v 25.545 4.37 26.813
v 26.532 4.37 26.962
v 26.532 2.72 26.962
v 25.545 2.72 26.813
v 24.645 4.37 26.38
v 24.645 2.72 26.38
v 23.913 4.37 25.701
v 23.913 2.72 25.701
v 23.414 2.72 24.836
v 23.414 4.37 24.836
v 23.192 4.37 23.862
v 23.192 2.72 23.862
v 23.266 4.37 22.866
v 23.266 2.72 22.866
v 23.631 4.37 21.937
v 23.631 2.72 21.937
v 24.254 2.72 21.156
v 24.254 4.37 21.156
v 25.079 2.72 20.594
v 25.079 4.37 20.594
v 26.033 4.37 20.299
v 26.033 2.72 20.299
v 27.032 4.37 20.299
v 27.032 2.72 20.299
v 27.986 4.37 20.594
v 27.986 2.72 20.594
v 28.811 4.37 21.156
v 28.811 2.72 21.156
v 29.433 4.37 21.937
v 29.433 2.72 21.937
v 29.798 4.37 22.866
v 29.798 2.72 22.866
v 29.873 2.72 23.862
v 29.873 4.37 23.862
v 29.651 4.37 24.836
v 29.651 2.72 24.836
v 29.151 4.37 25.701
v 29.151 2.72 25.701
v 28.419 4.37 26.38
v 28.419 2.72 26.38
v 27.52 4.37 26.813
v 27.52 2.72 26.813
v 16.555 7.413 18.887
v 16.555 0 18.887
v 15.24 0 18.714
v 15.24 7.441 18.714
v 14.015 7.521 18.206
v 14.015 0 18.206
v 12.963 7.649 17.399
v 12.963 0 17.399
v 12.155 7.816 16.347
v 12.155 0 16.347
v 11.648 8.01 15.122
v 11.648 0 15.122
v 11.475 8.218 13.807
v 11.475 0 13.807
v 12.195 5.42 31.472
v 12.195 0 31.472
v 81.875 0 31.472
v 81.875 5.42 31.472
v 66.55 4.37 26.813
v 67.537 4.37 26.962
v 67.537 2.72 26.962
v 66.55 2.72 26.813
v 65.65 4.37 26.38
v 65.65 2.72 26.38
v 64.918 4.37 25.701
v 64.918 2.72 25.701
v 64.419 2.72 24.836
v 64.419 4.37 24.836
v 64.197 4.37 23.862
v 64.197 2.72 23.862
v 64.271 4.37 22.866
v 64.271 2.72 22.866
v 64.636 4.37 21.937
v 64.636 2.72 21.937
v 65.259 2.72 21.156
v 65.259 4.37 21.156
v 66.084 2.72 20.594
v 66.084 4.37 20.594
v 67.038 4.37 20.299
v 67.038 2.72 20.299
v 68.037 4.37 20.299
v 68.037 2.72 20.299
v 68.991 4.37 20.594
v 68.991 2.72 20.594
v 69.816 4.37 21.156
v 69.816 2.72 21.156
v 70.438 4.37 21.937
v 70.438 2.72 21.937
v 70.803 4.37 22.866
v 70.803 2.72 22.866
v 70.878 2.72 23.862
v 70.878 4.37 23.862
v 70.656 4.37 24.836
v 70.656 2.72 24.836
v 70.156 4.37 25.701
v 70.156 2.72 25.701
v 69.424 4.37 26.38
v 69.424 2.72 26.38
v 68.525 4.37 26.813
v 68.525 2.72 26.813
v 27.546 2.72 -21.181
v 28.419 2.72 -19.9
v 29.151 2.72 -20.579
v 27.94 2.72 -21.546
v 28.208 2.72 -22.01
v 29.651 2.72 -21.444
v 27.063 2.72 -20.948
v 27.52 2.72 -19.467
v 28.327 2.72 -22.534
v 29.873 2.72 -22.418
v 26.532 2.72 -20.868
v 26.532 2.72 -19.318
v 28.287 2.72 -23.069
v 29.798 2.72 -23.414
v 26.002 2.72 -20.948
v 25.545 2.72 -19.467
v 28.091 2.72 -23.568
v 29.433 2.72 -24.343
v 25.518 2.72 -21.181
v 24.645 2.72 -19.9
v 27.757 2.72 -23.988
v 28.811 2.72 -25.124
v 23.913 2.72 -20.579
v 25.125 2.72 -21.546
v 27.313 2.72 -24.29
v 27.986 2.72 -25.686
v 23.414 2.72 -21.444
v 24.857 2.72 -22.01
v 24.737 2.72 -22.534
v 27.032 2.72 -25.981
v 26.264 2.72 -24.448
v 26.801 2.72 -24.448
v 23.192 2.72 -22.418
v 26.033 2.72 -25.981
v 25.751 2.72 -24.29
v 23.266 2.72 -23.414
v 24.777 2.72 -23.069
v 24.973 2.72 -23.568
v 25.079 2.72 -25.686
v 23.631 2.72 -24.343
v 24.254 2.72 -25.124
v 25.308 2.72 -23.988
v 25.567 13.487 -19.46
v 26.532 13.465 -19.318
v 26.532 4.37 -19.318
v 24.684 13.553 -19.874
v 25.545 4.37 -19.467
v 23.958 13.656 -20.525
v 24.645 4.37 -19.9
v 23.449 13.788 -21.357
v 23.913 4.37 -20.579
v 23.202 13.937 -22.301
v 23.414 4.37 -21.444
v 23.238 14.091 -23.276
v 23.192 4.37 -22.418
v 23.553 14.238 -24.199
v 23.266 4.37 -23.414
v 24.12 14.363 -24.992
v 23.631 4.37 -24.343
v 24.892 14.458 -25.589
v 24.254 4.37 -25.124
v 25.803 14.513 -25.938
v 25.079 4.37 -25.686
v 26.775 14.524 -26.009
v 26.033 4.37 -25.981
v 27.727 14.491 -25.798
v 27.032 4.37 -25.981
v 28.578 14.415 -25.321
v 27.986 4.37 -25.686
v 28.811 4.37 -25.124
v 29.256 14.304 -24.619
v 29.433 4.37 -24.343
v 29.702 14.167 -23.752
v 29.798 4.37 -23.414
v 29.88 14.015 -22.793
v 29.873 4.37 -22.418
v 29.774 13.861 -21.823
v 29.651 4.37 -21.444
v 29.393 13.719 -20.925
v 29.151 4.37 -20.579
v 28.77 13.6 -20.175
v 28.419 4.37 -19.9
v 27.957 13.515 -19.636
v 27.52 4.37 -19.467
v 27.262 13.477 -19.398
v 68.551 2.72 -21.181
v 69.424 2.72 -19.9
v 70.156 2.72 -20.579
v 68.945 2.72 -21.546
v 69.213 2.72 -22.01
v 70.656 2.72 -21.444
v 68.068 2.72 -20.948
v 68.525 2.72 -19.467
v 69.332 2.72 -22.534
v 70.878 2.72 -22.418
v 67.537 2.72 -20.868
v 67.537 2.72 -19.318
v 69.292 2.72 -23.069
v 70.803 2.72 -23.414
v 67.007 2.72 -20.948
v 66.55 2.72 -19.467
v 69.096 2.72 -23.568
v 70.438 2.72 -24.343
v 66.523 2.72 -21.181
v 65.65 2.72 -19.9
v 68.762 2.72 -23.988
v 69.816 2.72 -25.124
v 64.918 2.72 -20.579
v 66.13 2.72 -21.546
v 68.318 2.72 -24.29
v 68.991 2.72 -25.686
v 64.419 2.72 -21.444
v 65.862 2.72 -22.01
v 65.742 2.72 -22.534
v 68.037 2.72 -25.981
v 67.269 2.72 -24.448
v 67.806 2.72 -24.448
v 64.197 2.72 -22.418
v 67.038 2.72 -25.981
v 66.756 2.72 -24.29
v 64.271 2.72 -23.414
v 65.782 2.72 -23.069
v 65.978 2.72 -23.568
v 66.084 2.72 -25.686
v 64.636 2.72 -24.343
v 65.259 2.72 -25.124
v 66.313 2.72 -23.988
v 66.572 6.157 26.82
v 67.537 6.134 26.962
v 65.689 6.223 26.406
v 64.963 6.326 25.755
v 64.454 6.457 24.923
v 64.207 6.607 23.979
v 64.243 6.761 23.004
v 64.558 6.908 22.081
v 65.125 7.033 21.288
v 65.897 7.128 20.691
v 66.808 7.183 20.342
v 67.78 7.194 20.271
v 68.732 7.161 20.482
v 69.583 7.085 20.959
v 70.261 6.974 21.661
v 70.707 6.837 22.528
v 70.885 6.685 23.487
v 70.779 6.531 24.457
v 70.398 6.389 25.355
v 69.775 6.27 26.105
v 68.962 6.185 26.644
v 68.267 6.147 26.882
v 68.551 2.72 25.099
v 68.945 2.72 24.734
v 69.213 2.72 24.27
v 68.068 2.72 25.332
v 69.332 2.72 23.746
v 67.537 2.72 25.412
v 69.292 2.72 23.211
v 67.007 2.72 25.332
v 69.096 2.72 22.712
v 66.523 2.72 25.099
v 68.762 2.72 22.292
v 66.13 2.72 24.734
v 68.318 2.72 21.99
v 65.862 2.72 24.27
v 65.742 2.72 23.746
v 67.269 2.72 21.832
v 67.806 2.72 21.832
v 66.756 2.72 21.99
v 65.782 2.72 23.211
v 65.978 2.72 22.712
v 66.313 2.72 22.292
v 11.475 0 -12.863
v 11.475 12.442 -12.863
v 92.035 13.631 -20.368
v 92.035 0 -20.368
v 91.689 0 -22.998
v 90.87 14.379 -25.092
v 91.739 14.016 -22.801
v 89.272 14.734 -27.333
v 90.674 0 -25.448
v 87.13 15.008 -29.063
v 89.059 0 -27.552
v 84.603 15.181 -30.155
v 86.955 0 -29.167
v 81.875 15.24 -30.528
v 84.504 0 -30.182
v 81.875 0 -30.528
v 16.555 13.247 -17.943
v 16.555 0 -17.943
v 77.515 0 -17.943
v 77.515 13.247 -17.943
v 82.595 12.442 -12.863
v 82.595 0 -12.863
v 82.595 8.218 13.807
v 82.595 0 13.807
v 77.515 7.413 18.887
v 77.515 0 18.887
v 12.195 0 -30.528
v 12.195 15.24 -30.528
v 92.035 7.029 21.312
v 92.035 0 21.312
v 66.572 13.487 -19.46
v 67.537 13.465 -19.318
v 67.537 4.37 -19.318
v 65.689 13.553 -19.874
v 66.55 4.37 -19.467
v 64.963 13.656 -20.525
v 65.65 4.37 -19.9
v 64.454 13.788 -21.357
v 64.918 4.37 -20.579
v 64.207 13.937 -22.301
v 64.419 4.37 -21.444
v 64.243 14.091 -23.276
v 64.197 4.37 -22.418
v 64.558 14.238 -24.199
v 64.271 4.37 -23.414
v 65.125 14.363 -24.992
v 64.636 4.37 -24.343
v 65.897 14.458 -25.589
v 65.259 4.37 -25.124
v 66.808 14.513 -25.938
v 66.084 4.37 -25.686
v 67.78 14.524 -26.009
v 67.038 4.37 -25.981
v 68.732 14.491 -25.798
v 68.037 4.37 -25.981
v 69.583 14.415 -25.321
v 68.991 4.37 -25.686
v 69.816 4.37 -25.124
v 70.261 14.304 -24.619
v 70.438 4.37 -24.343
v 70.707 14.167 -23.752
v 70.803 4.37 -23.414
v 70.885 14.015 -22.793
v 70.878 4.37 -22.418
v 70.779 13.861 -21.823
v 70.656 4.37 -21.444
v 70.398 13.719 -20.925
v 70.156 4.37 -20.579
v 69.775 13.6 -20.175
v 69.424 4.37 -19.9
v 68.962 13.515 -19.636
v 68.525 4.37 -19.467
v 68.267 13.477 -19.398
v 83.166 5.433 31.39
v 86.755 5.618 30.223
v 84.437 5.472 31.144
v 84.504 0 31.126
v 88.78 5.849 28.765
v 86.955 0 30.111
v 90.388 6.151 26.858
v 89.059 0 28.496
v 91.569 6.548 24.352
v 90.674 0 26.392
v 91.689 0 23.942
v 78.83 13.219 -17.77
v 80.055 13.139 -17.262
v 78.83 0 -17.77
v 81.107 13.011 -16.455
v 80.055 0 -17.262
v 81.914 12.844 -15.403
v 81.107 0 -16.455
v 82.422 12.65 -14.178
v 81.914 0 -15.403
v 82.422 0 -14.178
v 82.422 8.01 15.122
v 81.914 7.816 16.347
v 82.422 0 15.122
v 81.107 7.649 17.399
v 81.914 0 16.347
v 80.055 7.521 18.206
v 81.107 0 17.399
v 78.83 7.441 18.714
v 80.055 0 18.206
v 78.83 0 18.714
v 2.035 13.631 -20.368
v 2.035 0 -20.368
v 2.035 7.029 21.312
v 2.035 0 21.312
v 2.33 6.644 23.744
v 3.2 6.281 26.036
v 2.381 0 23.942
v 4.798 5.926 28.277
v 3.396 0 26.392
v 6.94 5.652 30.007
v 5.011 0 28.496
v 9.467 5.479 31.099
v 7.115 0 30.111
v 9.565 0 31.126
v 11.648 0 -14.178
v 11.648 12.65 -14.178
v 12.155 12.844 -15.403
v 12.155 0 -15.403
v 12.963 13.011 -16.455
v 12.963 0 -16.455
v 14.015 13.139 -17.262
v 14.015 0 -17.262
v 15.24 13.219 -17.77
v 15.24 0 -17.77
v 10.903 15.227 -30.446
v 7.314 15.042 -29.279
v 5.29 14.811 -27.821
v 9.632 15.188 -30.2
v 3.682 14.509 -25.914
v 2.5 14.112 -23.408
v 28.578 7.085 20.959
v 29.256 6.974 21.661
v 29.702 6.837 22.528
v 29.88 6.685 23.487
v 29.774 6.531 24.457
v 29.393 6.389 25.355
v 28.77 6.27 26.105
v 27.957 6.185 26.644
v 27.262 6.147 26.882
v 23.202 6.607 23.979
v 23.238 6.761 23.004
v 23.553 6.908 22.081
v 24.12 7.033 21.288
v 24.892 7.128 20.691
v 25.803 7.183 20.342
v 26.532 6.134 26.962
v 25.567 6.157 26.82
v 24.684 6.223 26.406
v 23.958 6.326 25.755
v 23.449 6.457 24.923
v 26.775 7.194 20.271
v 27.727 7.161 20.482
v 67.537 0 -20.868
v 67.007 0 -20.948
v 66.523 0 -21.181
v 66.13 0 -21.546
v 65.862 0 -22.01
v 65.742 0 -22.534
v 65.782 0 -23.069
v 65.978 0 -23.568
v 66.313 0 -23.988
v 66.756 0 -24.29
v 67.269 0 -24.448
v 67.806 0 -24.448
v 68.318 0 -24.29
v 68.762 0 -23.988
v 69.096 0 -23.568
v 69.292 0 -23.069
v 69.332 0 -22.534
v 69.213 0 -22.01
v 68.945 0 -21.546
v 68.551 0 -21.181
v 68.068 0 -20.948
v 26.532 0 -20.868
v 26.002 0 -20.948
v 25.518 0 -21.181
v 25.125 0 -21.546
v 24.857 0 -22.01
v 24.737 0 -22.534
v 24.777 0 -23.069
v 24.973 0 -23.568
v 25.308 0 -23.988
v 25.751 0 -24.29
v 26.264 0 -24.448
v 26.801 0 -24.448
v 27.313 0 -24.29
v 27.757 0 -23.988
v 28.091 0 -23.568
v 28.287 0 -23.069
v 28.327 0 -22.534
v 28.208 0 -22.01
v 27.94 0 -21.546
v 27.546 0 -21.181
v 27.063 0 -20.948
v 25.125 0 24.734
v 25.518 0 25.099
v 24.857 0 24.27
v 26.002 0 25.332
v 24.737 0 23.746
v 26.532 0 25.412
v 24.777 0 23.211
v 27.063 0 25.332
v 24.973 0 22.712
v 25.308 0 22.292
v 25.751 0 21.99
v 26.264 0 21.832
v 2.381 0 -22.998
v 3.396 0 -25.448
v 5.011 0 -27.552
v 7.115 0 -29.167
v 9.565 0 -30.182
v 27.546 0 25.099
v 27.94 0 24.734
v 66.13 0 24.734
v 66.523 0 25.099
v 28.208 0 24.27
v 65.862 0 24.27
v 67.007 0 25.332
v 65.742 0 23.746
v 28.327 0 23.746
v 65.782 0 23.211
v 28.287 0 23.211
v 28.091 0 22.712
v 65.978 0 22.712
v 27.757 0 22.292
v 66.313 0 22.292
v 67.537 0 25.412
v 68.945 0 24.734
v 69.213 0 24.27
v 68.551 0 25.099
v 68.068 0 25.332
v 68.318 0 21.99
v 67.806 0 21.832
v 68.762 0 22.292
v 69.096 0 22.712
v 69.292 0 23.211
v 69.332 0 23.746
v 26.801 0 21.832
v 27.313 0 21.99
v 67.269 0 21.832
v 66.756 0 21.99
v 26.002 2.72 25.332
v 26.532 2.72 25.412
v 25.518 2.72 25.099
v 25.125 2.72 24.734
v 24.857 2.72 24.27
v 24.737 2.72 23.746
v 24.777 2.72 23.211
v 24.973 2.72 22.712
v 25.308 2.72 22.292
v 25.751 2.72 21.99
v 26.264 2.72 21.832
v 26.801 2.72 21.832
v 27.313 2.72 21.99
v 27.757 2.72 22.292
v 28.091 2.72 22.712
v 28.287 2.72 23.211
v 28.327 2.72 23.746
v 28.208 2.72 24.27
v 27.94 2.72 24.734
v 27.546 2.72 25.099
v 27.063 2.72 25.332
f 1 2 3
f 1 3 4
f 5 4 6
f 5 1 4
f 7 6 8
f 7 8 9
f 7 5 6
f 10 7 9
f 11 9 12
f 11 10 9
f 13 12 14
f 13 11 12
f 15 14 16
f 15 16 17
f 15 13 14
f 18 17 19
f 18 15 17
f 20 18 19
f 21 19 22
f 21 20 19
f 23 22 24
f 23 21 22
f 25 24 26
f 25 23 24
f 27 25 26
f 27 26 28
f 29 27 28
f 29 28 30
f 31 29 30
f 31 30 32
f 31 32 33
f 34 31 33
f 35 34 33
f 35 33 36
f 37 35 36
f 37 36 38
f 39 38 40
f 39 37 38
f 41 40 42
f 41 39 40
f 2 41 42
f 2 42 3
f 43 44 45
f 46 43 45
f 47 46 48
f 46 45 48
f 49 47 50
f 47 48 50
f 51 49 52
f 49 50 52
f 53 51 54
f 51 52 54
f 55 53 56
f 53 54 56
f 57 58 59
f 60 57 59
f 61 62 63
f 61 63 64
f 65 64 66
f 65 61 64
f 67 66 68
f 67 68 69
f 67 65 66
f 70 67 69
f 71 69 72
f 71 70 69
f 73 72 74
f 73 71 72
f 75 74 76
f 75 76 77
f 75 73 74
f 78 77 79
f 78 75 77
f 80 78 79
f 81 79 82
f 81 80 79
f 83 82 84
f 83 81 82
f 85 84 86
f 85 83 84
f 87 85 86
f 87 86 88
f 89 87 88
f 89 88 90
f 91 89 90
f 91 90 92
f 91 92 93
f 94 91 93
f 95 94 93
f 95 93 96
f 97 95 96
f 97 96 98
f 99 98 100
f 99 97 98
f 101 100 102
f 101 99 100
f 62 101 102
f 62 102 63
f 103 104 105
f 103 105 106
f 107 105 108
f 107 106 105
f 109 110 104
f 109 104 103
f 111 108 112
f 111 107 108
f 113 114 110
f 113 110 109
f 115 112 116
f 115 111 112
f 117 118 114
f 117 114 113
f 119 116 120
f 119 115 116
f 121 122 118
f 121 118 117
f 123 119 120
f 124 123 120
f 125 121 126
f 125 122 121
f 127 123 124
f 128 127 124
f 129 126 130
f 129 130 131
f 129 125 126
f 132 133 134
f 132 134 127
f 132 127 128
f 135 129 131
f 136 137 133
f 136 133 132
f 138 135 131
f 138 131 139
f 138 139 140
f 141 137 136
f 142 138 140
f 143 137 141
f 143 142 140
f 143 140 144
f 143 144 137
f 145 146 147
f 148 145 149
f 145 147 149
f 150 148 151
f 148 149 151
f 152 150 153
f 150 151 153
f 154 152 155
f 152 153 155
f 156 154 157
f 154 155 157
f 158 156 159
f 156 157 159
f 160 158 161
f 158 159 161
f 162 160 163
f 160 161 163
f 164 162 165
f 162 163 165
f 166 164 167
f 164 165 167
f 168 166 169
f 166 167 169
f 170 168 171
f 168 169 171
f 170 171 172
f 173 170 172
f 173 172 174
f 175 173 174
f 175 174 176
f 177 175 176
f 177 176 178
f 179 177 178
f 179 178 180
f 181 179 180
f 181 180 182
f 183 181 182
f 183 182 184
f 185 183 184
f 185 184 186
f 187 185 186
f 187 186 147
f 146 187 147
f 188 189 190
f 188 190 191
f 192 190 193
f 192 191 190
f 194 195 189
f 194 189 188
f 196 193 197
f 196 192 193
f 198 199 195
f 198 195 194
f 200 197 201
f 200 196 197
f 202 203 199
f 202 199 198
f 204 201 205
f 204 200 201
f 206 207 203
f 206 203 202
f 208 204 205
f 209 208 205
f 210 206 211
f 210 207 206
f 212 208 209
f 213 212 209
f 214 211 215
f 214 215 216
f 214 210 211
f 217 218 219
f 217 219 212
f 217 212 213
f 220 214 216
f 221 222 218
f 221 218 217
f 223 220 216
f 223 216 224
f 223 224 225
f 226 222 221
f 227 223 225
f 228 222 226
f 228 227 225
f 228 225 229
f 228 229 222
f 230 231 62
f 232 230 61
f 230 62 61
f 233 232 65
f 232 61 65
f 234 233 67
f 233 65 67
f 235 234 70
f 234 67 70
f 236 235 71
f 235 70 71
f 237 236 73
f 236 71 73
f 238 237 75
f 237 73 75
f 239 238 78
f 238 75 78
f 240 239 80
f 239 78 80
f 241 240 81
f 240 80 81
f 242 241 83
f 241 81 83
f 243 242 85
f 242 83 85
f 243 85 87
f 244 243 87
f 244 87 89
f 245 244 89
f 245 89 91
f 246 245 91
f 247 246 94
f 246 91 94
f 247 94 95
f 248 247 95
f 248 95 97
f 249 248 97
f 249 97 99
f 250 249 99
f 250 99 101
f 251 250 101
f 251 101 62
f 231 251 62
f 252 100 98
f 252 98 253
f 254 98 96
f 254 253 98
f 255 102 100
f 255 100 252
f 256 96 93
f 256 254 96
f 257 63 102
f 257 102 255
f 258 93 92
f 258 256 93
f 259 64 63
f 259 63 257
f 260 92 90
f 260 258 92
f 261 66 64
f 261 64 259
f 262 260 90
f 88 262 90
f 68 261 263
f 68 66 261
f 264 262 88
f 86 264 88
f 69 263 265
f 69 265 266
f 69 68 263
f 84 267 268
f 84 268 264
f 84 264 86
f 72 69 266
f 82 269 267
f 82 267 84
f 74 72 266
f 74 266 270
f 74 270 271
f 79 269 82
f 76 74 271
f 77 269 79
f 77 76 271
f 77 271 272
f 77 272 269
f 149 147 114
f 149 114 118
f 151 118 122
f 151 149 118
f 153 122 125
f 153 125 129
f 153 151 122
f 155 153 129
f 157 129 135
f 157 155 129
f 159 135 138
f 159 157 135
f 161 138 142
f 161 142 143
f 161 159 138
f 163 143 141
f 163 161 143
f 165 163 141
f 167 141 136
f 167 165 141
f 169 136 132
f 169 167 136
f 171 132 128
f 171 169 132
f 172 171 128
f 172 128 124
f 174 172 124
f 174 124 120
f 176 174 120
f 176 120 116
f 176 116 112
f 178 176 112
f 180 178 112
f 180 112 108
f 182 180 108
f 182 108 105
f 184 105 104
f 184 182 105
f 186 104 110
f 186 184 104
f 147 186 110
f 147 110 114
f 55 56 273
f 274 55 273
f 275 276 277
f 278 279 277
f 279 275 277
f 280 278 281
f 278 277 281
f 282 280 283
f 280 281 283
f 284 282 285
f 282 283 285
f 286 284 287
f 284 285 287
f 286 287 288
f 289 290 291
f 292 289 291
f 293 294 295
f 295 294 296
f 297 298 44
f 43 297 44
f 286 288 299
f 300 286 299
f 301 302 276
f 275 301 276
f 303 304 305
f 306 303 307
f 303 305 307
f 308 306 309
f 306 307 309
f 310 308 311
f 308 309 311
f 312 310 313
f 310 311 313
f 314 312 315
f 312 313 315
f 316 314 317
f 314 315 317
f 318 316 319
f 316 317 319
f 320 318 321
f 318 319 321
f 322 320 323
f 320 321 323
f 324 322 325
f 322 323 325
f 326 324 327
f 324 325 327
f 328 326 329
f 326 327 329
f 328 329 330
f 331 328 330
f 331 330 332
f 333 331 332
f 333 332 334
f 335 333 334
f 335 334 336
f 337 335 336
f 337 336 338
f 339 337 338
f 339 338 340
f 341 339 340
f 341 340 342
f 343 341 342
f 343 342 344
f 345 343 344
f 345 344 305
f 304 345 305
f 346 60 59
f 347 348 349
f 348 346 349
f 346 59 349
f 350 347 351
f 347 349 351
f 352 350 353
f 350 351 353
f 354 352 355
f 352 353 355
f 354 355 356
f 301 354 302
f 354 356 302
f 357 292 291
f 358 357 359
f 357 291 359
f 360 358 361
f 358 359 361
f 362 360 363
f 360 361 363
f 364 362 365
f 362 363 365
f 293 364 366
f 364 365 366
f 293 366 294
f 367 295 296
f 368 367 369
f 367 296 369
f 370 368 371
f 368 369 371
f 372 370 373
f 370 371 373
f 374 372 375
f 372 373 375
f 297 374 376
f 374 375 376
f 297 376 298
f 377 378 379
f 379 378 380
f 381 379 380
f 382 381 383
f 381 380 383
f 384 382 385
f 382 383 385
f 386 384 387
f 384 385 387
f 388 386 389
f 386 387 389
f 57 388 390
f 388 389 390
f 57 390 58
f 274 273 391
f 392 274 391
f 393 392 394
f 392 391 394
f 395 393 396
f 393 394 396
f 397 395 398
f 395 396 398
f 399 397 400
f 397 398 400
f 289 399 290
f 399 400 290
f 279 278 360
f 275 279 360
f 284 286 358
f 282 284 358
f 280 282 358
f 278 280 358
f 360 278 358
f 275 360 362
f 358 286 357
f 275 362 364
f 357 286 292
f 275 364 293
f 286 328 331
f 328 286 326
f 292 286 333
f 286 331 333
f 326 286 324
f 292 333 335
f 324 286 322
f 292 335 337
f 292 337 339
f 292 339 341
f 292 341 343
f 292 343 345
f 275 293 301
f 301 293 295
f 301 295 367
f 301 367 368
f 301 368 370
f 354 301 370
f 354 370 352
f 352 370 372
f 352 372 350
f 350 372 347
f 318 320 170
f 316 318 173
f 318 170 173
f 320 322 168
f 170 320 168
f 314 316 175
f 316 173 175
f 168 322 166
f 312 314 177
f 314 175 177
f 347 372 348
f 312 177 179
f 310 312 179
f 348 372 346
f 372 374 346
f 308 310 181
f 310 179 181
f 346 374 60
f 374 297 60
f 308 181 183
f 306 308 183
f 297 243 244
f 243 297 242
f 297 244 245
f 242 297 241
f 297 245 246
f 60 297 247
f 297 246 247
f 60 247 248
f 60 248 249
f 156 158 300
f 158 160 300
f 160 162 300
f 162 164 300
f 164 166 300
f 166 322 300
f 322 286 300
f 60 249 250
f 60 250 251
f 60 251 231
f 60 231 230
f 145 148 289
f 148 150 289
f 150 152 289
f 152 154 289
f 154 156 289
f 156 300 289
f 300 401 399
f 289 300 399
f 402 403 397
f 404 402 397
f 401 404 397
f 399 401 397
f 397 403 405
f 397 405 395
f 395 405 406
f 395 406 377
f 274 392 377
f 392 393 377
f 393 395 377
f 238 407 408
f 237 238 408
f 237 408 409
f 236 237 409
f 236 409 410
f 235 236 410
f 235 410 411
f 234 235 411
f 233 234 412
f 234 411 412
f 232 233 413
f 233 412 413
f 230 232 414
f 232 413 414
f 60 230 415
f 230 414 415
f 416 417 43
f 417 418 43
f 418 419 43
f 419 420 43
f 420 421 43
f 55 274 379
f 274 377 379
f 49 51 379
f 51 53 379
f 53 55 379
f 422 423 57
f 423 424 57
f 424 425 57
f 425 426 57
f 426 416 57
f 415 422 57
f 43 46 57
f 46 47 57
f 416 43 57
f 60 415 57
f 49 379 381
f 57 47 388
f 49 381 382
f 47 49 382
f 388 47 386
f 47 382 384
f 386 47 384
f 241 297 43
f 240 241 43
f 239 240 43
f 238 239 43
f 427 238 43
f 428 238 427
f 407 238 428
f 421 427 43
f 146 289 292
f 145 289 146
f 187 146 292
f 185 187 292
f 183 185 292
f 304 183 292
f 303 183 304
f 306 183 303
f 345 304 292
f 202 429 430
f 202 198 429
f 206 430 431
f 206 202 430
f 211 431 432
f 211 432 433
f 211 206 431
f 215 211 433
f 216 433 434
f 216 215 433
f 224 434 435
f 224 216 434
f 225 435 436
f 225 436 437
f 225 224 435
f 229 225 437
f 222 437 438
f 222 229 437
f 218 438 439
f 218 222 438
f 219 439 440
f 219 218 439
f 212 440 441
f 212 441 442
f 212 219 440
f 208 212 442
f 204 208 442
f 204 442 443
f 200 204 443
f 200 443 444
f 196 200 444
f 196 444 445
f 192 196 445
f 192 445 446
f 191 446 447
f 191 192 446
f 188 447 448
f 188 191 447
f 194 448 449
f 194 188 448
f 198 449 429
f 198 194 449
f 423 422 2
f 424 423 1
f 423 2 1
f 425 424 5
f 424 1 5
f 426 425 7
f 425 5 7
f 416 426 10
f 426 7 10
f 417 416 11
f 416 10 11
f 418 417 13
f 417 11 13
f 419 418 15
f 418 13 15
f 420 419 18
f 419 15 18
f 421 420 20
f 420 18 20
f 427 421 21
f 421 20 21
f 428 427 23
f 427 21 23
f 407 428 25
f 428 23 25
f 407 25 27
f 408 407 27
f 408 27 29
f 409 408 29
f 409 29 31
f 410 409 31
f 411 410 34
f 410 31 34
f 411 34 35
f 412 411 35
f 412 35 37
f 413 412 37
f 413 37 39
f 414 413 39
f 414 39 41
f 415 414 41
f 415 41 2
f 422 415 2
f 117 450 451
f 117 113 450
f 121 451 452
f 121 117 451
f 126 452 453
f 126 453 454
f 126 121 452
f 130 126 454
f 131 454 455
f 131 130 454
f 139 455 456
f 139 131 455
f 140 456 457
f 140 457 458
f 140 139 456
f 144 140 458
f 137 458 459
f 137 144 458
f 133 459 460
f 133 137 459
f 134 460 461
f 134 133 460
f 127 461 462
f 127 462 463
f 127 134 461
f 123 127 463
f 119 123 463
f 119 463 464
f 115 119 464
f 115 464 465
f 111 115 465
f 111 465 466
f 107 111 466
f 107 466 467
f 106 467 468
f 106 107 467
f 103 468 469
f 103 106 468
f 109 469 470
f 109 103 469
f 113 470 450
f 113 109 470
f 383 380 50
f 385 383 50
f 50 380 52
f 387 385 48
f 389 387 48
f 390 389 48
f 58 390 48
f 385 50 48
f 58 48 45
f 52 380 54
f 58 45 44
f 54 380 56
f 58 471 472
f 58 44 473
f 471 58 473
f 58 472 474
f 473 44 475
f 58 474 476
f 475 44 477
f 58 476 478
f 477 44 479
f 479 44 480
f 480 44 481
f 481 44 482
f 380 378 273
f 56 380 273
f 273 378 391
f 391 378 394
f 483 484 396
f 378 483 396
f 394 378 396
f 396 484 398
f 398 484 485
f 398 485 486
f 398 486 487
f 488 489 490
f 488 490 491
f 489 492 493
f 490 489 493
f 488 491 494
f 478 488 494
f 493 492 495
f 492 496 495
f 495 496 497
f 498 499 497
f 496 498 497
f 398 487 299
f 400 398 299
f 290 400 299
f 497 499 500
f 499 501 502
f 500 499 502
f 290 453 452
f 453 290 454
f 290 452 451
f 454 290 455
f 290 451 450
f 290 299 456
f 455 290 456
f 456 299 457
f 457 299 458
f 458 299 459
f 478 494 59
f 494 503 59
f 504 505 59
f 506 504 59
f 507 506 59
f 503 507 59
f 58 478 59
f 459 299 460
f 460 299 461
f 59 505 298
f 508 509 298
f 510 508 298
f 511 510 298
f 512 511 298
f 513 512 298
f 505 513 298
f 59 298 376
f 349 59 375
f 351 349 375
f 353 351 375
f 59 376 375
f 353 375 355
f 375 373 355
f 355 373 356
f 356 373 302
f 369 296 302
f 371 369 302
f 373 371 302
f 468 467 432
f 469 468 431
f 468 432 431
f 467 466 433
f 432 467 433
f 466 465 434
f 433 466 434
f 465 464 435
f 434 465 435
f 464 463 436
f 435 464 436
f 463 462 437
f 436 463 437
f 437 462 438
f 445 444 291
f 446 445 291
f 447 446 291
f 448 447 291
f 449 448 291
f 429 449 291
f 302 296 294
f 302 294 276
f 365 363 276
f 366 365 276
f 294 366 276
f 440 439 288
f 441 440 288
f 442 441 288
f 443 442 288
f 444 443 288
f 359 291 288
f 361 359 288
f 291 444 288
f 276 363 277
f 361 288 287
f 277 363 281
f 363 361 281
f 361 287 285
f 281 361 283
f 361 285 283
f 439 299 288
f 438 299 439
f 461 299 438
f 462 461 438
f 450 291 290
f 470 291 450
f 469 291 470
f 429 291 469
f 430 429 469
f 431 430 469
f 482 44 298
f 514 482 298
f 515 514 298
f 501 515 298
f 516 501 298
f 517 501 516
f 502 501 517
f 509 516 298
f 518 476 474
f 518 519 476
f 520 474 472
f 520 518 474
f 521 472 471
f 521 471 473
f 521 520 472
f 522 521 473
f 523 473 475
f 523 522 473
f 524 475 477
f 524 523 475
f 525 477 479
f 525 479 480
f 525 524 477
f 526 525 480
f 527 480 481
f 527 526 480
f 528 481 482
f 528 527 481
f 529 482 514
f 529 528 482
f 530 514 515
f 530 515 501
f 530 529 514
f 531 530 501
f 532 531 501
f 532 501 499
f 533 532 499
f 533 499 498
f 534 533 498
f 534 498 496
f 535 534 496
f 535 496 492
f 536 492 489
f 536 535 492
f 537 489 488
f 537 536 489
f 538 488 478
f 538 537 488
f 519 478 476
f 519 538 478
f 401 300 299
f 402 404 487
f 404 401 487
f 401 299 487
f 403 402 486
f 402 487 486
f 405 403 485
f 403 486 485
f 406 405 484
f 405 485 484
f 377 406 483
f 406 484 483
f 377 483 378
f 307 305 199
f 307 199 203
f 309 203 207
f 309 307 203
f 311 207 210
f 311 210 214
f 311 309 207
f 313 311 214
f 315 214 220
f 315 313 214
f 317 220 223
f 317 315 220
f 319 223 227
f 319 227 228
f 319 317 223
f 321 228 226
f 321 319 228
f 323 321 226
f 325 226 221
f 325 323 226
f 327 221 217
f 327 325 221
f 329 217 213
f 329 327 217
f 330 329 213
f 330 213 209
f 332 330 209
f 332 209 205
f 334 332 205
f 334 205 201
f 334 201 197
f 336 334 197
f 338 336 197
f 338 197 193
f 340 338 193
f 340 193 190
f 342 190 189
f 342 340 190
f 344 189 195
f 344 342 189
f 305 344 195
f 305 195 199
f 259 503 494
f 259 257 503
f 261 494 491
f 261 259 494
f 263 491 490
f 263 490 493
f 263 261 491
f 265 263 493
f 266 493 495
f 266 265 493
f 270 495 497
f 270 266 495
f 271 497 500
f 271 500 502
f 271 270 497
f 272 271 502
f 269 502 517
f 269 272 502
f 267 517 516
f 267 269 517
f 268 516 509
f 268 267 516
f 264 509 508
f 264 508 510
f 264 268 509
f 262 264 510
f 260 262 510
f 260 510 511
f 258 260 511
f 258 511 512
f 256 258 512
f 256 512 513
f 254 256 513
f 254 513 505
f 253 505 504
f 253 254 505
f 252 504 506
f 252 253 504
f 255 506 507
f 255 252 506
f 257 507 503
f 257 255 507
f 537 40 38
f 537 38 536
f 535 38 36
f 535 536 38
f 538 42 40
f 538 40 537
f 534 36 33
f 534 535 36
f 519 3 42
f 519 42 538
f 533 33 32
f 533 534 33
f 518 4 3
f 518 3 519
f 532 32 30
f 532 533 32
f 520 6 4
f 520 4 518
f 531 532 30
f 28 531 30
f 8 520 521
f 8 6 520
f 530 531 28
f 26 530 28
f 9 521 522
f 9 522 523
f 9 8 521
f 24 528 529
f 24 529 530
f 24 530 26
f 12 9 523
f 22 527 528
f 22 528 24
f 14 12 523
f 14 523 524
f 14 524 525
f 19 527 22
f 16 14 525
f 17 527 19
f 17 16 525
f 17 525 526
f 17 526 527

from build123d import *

# Parameters (mm, degrees)
BOSS_EXTRUDE1_DEPTH            = 15.24
CUT_EXTRUDE1_DEPTH             = 97.554341556
CBORE_FOR_M3_SBHCS2_AT_2_COUNT = 2
CBORE_FOR_M3_SBHCS2_AT_2_PITCH = 41.005
CBORE_FOR_M3_SBHCS2_AT_3_COUNT = 2
CBORE_FOR_M3_SBHCS2_AT_3_PITCH = 61.832422118
CBORE_FOR_M3_SBHCS2_AT_4_COUNT = 2
CBORE_FOR_M3_SBHCS2_AT_4_PITCH = 46.28
SKETCH16_R                     = 3.35
CUT_EXTRUDE2_DEPTH             = 98.872548965


with BuildPart() as part:
    # Sketch2 → Boss-Extrude1 (new body)
    with BuildSketch(Plane(origin=(0, 0, 0), x_dir=(1, 0, 0), z_dir=(0, 1, 0))):
        with BuildLine():
            Line((81.8747525, 30.528055776), (12.1947525, 30.528055776))
            ThreePointArc((12.1947525, 30.528055776), (5.010547603, 27.552260673), (2.0347525, 20.368055776))
            Line((2.0347525, 20.368055776), (2.0347525, -21.311944224))
            ThreePointArc((2.0347525, -21.311944224), (5.010547603, -28.496149121), (12.1947525, -31.471944224))
            Line((12.1947525, -31.471944224), (81.8747525, -31.471944224))
            ThreePointArc((81.8747525, -31.471944224), (89.058957397, -28.496149121), (92.0347525, -21.311944224))
            Line((92.0347525, -21.311944224), (92.0347525, 20.368055776))
            ThreePointArc((92.0347525, 20.368055776), (89.058957397, 27.552260673), (81.8747525, 30.528055776))
        make_face()
        with BuildLine():
            Line((16.5547525, 17.943055776), (77.5147525, 17.943055776))
            ThreePointArc((77.5147525, 17.943055776), (81.106854948, 16.455158224), (82.5947525, 12.863055776))
            Line((82.5947525, 12.863055776), (82.5947525, -13.806944224))
            ThreePointArc((82.5947525, -13.806944224), (81.106854948, -17.399046672), (77.5147525, -18.886944224))
            Line((77.5147525, -18.886944224), (16.5547525, -18.886944224))
            ThreePointArc((16.5547525, -18.886944224), (12.962650051, -17.399046672), (11.4747525, -13.806944224))
            Line((11.4747525, -13.806944224), (11.4747525, 12.863055776))
            ThreePointArc((11.4747525, 12.863055776), (12.962650051, 16.455158224), (16.5547525, 17.943055776))
        make_face(mode=Mode.SUBTRACT)
    extrude(amount=BOSS_EXTRUDE1_DEPTH)

    # Sketch3 → Cut-Extrude1 (cut, through all)
    with BuildSketch(Plane.ZY.offset(-2.0347525)):
        Polygon((21.311944224, 15.24), (-20.368055776, 15.24), (-30.528055776, 15.24), (31.471944224, 5.4201647), (31.471944224, 15.24), align=None)
    extrude(amount=-CUT_EXTRUDE1_DEPTH, mode=Mode.SUBTRACT)

    # Sketch15 → CBORE for M3 SBHCS2 (revolve, cut)
    with BuildSketch(Plane(origin=(67.5372525, 4.37, 23.611944224), x_dir=(0, 0, 1), z_dir=(1, 0, 0))):
        Polygon((0, 0), (0, 4.37), (1.8, 4.37), (1.8, 1.65), (3.35, 1.65), (3.35, 0), align=None)
    cbore_for_m3_sbhcs2 = revolve(axis=Axis((67.5372525, 10.72, 23.611944224), (0, -1, 0)), mode=Mode.SUBTRACT)

    # CBORE for M3 SBHCS2 at 2: CBORE for M3 SBHCS2 ×2
    with Locations(*[(-i * CBORE_FOR_M3_SBHCS2_AT_2_PITCH, 0, 0) for i in range(1, CBORE_FOR_M3_SBHCS2_AT_2_COUNT)]):
        add(cbore_for_m3_sbhcs2, mode=Mode.SUBTRACT)

    # CBORE for M3 SBHCS2 at 3: CBORE for M3 SBHCS2 ×2
    with Locations(*[Vector(-0.6631634116100382, 0, -0.7484746418561787) * (i * CBORE_FOR_M3_SBHCS2_AT_3_PITCH) for i in range(1, CBORE_FOR_M3_SBHCS2_AT_3_COUNT)]):
        add(cbore_for_m3_sbhcs2, mode=Mode.SUBTRACT)

    # CBORE for M3 SBHCS2 at 4: CBORE for M3 SBHCS2 ×2
    with Locations(*[(0, 0, -i * CBORE_FOR_M3_SBHCS2_AT_4_PITCH) for i in range(1, CBORE_FOR_M3_SBHCS2_AT_4_COUNT)]):
        add(cbore_for_m3_sbhcs2, mode=Mode.SUBTRACT)

    # Sketch16 → Cut-Extrude2 (cut, through all)
    with BuildSketch(Plane(origin=(0, 4.37, 0), x_dir=(-1, 0, 0), z_dir=(0, -1, 0))):
        with Locations(Location((-67.5372525, -23.611944224, 0), (0, 0, 270))):
            Circle(SKETCH16_R)
        with Locations(Location((-26.5322525, -23.611944224, 0), (0, 0, 270))):
            Circle(SKETCH16_R)
        with Locations(Location((-67.5372525, 22.668055776, 0), (0, 0, 270))):
            Circle(SKETCH16_R)
        with Locations(Location((-26.5322525, 22.668055776, 0), (0, 0, 270))):
            Circle(SKETCH16_R)
    extrude(amount=-CUT_EXTRUDE2_DEPTH, mode=Mode.SUBTRACT)


solid = part.part
